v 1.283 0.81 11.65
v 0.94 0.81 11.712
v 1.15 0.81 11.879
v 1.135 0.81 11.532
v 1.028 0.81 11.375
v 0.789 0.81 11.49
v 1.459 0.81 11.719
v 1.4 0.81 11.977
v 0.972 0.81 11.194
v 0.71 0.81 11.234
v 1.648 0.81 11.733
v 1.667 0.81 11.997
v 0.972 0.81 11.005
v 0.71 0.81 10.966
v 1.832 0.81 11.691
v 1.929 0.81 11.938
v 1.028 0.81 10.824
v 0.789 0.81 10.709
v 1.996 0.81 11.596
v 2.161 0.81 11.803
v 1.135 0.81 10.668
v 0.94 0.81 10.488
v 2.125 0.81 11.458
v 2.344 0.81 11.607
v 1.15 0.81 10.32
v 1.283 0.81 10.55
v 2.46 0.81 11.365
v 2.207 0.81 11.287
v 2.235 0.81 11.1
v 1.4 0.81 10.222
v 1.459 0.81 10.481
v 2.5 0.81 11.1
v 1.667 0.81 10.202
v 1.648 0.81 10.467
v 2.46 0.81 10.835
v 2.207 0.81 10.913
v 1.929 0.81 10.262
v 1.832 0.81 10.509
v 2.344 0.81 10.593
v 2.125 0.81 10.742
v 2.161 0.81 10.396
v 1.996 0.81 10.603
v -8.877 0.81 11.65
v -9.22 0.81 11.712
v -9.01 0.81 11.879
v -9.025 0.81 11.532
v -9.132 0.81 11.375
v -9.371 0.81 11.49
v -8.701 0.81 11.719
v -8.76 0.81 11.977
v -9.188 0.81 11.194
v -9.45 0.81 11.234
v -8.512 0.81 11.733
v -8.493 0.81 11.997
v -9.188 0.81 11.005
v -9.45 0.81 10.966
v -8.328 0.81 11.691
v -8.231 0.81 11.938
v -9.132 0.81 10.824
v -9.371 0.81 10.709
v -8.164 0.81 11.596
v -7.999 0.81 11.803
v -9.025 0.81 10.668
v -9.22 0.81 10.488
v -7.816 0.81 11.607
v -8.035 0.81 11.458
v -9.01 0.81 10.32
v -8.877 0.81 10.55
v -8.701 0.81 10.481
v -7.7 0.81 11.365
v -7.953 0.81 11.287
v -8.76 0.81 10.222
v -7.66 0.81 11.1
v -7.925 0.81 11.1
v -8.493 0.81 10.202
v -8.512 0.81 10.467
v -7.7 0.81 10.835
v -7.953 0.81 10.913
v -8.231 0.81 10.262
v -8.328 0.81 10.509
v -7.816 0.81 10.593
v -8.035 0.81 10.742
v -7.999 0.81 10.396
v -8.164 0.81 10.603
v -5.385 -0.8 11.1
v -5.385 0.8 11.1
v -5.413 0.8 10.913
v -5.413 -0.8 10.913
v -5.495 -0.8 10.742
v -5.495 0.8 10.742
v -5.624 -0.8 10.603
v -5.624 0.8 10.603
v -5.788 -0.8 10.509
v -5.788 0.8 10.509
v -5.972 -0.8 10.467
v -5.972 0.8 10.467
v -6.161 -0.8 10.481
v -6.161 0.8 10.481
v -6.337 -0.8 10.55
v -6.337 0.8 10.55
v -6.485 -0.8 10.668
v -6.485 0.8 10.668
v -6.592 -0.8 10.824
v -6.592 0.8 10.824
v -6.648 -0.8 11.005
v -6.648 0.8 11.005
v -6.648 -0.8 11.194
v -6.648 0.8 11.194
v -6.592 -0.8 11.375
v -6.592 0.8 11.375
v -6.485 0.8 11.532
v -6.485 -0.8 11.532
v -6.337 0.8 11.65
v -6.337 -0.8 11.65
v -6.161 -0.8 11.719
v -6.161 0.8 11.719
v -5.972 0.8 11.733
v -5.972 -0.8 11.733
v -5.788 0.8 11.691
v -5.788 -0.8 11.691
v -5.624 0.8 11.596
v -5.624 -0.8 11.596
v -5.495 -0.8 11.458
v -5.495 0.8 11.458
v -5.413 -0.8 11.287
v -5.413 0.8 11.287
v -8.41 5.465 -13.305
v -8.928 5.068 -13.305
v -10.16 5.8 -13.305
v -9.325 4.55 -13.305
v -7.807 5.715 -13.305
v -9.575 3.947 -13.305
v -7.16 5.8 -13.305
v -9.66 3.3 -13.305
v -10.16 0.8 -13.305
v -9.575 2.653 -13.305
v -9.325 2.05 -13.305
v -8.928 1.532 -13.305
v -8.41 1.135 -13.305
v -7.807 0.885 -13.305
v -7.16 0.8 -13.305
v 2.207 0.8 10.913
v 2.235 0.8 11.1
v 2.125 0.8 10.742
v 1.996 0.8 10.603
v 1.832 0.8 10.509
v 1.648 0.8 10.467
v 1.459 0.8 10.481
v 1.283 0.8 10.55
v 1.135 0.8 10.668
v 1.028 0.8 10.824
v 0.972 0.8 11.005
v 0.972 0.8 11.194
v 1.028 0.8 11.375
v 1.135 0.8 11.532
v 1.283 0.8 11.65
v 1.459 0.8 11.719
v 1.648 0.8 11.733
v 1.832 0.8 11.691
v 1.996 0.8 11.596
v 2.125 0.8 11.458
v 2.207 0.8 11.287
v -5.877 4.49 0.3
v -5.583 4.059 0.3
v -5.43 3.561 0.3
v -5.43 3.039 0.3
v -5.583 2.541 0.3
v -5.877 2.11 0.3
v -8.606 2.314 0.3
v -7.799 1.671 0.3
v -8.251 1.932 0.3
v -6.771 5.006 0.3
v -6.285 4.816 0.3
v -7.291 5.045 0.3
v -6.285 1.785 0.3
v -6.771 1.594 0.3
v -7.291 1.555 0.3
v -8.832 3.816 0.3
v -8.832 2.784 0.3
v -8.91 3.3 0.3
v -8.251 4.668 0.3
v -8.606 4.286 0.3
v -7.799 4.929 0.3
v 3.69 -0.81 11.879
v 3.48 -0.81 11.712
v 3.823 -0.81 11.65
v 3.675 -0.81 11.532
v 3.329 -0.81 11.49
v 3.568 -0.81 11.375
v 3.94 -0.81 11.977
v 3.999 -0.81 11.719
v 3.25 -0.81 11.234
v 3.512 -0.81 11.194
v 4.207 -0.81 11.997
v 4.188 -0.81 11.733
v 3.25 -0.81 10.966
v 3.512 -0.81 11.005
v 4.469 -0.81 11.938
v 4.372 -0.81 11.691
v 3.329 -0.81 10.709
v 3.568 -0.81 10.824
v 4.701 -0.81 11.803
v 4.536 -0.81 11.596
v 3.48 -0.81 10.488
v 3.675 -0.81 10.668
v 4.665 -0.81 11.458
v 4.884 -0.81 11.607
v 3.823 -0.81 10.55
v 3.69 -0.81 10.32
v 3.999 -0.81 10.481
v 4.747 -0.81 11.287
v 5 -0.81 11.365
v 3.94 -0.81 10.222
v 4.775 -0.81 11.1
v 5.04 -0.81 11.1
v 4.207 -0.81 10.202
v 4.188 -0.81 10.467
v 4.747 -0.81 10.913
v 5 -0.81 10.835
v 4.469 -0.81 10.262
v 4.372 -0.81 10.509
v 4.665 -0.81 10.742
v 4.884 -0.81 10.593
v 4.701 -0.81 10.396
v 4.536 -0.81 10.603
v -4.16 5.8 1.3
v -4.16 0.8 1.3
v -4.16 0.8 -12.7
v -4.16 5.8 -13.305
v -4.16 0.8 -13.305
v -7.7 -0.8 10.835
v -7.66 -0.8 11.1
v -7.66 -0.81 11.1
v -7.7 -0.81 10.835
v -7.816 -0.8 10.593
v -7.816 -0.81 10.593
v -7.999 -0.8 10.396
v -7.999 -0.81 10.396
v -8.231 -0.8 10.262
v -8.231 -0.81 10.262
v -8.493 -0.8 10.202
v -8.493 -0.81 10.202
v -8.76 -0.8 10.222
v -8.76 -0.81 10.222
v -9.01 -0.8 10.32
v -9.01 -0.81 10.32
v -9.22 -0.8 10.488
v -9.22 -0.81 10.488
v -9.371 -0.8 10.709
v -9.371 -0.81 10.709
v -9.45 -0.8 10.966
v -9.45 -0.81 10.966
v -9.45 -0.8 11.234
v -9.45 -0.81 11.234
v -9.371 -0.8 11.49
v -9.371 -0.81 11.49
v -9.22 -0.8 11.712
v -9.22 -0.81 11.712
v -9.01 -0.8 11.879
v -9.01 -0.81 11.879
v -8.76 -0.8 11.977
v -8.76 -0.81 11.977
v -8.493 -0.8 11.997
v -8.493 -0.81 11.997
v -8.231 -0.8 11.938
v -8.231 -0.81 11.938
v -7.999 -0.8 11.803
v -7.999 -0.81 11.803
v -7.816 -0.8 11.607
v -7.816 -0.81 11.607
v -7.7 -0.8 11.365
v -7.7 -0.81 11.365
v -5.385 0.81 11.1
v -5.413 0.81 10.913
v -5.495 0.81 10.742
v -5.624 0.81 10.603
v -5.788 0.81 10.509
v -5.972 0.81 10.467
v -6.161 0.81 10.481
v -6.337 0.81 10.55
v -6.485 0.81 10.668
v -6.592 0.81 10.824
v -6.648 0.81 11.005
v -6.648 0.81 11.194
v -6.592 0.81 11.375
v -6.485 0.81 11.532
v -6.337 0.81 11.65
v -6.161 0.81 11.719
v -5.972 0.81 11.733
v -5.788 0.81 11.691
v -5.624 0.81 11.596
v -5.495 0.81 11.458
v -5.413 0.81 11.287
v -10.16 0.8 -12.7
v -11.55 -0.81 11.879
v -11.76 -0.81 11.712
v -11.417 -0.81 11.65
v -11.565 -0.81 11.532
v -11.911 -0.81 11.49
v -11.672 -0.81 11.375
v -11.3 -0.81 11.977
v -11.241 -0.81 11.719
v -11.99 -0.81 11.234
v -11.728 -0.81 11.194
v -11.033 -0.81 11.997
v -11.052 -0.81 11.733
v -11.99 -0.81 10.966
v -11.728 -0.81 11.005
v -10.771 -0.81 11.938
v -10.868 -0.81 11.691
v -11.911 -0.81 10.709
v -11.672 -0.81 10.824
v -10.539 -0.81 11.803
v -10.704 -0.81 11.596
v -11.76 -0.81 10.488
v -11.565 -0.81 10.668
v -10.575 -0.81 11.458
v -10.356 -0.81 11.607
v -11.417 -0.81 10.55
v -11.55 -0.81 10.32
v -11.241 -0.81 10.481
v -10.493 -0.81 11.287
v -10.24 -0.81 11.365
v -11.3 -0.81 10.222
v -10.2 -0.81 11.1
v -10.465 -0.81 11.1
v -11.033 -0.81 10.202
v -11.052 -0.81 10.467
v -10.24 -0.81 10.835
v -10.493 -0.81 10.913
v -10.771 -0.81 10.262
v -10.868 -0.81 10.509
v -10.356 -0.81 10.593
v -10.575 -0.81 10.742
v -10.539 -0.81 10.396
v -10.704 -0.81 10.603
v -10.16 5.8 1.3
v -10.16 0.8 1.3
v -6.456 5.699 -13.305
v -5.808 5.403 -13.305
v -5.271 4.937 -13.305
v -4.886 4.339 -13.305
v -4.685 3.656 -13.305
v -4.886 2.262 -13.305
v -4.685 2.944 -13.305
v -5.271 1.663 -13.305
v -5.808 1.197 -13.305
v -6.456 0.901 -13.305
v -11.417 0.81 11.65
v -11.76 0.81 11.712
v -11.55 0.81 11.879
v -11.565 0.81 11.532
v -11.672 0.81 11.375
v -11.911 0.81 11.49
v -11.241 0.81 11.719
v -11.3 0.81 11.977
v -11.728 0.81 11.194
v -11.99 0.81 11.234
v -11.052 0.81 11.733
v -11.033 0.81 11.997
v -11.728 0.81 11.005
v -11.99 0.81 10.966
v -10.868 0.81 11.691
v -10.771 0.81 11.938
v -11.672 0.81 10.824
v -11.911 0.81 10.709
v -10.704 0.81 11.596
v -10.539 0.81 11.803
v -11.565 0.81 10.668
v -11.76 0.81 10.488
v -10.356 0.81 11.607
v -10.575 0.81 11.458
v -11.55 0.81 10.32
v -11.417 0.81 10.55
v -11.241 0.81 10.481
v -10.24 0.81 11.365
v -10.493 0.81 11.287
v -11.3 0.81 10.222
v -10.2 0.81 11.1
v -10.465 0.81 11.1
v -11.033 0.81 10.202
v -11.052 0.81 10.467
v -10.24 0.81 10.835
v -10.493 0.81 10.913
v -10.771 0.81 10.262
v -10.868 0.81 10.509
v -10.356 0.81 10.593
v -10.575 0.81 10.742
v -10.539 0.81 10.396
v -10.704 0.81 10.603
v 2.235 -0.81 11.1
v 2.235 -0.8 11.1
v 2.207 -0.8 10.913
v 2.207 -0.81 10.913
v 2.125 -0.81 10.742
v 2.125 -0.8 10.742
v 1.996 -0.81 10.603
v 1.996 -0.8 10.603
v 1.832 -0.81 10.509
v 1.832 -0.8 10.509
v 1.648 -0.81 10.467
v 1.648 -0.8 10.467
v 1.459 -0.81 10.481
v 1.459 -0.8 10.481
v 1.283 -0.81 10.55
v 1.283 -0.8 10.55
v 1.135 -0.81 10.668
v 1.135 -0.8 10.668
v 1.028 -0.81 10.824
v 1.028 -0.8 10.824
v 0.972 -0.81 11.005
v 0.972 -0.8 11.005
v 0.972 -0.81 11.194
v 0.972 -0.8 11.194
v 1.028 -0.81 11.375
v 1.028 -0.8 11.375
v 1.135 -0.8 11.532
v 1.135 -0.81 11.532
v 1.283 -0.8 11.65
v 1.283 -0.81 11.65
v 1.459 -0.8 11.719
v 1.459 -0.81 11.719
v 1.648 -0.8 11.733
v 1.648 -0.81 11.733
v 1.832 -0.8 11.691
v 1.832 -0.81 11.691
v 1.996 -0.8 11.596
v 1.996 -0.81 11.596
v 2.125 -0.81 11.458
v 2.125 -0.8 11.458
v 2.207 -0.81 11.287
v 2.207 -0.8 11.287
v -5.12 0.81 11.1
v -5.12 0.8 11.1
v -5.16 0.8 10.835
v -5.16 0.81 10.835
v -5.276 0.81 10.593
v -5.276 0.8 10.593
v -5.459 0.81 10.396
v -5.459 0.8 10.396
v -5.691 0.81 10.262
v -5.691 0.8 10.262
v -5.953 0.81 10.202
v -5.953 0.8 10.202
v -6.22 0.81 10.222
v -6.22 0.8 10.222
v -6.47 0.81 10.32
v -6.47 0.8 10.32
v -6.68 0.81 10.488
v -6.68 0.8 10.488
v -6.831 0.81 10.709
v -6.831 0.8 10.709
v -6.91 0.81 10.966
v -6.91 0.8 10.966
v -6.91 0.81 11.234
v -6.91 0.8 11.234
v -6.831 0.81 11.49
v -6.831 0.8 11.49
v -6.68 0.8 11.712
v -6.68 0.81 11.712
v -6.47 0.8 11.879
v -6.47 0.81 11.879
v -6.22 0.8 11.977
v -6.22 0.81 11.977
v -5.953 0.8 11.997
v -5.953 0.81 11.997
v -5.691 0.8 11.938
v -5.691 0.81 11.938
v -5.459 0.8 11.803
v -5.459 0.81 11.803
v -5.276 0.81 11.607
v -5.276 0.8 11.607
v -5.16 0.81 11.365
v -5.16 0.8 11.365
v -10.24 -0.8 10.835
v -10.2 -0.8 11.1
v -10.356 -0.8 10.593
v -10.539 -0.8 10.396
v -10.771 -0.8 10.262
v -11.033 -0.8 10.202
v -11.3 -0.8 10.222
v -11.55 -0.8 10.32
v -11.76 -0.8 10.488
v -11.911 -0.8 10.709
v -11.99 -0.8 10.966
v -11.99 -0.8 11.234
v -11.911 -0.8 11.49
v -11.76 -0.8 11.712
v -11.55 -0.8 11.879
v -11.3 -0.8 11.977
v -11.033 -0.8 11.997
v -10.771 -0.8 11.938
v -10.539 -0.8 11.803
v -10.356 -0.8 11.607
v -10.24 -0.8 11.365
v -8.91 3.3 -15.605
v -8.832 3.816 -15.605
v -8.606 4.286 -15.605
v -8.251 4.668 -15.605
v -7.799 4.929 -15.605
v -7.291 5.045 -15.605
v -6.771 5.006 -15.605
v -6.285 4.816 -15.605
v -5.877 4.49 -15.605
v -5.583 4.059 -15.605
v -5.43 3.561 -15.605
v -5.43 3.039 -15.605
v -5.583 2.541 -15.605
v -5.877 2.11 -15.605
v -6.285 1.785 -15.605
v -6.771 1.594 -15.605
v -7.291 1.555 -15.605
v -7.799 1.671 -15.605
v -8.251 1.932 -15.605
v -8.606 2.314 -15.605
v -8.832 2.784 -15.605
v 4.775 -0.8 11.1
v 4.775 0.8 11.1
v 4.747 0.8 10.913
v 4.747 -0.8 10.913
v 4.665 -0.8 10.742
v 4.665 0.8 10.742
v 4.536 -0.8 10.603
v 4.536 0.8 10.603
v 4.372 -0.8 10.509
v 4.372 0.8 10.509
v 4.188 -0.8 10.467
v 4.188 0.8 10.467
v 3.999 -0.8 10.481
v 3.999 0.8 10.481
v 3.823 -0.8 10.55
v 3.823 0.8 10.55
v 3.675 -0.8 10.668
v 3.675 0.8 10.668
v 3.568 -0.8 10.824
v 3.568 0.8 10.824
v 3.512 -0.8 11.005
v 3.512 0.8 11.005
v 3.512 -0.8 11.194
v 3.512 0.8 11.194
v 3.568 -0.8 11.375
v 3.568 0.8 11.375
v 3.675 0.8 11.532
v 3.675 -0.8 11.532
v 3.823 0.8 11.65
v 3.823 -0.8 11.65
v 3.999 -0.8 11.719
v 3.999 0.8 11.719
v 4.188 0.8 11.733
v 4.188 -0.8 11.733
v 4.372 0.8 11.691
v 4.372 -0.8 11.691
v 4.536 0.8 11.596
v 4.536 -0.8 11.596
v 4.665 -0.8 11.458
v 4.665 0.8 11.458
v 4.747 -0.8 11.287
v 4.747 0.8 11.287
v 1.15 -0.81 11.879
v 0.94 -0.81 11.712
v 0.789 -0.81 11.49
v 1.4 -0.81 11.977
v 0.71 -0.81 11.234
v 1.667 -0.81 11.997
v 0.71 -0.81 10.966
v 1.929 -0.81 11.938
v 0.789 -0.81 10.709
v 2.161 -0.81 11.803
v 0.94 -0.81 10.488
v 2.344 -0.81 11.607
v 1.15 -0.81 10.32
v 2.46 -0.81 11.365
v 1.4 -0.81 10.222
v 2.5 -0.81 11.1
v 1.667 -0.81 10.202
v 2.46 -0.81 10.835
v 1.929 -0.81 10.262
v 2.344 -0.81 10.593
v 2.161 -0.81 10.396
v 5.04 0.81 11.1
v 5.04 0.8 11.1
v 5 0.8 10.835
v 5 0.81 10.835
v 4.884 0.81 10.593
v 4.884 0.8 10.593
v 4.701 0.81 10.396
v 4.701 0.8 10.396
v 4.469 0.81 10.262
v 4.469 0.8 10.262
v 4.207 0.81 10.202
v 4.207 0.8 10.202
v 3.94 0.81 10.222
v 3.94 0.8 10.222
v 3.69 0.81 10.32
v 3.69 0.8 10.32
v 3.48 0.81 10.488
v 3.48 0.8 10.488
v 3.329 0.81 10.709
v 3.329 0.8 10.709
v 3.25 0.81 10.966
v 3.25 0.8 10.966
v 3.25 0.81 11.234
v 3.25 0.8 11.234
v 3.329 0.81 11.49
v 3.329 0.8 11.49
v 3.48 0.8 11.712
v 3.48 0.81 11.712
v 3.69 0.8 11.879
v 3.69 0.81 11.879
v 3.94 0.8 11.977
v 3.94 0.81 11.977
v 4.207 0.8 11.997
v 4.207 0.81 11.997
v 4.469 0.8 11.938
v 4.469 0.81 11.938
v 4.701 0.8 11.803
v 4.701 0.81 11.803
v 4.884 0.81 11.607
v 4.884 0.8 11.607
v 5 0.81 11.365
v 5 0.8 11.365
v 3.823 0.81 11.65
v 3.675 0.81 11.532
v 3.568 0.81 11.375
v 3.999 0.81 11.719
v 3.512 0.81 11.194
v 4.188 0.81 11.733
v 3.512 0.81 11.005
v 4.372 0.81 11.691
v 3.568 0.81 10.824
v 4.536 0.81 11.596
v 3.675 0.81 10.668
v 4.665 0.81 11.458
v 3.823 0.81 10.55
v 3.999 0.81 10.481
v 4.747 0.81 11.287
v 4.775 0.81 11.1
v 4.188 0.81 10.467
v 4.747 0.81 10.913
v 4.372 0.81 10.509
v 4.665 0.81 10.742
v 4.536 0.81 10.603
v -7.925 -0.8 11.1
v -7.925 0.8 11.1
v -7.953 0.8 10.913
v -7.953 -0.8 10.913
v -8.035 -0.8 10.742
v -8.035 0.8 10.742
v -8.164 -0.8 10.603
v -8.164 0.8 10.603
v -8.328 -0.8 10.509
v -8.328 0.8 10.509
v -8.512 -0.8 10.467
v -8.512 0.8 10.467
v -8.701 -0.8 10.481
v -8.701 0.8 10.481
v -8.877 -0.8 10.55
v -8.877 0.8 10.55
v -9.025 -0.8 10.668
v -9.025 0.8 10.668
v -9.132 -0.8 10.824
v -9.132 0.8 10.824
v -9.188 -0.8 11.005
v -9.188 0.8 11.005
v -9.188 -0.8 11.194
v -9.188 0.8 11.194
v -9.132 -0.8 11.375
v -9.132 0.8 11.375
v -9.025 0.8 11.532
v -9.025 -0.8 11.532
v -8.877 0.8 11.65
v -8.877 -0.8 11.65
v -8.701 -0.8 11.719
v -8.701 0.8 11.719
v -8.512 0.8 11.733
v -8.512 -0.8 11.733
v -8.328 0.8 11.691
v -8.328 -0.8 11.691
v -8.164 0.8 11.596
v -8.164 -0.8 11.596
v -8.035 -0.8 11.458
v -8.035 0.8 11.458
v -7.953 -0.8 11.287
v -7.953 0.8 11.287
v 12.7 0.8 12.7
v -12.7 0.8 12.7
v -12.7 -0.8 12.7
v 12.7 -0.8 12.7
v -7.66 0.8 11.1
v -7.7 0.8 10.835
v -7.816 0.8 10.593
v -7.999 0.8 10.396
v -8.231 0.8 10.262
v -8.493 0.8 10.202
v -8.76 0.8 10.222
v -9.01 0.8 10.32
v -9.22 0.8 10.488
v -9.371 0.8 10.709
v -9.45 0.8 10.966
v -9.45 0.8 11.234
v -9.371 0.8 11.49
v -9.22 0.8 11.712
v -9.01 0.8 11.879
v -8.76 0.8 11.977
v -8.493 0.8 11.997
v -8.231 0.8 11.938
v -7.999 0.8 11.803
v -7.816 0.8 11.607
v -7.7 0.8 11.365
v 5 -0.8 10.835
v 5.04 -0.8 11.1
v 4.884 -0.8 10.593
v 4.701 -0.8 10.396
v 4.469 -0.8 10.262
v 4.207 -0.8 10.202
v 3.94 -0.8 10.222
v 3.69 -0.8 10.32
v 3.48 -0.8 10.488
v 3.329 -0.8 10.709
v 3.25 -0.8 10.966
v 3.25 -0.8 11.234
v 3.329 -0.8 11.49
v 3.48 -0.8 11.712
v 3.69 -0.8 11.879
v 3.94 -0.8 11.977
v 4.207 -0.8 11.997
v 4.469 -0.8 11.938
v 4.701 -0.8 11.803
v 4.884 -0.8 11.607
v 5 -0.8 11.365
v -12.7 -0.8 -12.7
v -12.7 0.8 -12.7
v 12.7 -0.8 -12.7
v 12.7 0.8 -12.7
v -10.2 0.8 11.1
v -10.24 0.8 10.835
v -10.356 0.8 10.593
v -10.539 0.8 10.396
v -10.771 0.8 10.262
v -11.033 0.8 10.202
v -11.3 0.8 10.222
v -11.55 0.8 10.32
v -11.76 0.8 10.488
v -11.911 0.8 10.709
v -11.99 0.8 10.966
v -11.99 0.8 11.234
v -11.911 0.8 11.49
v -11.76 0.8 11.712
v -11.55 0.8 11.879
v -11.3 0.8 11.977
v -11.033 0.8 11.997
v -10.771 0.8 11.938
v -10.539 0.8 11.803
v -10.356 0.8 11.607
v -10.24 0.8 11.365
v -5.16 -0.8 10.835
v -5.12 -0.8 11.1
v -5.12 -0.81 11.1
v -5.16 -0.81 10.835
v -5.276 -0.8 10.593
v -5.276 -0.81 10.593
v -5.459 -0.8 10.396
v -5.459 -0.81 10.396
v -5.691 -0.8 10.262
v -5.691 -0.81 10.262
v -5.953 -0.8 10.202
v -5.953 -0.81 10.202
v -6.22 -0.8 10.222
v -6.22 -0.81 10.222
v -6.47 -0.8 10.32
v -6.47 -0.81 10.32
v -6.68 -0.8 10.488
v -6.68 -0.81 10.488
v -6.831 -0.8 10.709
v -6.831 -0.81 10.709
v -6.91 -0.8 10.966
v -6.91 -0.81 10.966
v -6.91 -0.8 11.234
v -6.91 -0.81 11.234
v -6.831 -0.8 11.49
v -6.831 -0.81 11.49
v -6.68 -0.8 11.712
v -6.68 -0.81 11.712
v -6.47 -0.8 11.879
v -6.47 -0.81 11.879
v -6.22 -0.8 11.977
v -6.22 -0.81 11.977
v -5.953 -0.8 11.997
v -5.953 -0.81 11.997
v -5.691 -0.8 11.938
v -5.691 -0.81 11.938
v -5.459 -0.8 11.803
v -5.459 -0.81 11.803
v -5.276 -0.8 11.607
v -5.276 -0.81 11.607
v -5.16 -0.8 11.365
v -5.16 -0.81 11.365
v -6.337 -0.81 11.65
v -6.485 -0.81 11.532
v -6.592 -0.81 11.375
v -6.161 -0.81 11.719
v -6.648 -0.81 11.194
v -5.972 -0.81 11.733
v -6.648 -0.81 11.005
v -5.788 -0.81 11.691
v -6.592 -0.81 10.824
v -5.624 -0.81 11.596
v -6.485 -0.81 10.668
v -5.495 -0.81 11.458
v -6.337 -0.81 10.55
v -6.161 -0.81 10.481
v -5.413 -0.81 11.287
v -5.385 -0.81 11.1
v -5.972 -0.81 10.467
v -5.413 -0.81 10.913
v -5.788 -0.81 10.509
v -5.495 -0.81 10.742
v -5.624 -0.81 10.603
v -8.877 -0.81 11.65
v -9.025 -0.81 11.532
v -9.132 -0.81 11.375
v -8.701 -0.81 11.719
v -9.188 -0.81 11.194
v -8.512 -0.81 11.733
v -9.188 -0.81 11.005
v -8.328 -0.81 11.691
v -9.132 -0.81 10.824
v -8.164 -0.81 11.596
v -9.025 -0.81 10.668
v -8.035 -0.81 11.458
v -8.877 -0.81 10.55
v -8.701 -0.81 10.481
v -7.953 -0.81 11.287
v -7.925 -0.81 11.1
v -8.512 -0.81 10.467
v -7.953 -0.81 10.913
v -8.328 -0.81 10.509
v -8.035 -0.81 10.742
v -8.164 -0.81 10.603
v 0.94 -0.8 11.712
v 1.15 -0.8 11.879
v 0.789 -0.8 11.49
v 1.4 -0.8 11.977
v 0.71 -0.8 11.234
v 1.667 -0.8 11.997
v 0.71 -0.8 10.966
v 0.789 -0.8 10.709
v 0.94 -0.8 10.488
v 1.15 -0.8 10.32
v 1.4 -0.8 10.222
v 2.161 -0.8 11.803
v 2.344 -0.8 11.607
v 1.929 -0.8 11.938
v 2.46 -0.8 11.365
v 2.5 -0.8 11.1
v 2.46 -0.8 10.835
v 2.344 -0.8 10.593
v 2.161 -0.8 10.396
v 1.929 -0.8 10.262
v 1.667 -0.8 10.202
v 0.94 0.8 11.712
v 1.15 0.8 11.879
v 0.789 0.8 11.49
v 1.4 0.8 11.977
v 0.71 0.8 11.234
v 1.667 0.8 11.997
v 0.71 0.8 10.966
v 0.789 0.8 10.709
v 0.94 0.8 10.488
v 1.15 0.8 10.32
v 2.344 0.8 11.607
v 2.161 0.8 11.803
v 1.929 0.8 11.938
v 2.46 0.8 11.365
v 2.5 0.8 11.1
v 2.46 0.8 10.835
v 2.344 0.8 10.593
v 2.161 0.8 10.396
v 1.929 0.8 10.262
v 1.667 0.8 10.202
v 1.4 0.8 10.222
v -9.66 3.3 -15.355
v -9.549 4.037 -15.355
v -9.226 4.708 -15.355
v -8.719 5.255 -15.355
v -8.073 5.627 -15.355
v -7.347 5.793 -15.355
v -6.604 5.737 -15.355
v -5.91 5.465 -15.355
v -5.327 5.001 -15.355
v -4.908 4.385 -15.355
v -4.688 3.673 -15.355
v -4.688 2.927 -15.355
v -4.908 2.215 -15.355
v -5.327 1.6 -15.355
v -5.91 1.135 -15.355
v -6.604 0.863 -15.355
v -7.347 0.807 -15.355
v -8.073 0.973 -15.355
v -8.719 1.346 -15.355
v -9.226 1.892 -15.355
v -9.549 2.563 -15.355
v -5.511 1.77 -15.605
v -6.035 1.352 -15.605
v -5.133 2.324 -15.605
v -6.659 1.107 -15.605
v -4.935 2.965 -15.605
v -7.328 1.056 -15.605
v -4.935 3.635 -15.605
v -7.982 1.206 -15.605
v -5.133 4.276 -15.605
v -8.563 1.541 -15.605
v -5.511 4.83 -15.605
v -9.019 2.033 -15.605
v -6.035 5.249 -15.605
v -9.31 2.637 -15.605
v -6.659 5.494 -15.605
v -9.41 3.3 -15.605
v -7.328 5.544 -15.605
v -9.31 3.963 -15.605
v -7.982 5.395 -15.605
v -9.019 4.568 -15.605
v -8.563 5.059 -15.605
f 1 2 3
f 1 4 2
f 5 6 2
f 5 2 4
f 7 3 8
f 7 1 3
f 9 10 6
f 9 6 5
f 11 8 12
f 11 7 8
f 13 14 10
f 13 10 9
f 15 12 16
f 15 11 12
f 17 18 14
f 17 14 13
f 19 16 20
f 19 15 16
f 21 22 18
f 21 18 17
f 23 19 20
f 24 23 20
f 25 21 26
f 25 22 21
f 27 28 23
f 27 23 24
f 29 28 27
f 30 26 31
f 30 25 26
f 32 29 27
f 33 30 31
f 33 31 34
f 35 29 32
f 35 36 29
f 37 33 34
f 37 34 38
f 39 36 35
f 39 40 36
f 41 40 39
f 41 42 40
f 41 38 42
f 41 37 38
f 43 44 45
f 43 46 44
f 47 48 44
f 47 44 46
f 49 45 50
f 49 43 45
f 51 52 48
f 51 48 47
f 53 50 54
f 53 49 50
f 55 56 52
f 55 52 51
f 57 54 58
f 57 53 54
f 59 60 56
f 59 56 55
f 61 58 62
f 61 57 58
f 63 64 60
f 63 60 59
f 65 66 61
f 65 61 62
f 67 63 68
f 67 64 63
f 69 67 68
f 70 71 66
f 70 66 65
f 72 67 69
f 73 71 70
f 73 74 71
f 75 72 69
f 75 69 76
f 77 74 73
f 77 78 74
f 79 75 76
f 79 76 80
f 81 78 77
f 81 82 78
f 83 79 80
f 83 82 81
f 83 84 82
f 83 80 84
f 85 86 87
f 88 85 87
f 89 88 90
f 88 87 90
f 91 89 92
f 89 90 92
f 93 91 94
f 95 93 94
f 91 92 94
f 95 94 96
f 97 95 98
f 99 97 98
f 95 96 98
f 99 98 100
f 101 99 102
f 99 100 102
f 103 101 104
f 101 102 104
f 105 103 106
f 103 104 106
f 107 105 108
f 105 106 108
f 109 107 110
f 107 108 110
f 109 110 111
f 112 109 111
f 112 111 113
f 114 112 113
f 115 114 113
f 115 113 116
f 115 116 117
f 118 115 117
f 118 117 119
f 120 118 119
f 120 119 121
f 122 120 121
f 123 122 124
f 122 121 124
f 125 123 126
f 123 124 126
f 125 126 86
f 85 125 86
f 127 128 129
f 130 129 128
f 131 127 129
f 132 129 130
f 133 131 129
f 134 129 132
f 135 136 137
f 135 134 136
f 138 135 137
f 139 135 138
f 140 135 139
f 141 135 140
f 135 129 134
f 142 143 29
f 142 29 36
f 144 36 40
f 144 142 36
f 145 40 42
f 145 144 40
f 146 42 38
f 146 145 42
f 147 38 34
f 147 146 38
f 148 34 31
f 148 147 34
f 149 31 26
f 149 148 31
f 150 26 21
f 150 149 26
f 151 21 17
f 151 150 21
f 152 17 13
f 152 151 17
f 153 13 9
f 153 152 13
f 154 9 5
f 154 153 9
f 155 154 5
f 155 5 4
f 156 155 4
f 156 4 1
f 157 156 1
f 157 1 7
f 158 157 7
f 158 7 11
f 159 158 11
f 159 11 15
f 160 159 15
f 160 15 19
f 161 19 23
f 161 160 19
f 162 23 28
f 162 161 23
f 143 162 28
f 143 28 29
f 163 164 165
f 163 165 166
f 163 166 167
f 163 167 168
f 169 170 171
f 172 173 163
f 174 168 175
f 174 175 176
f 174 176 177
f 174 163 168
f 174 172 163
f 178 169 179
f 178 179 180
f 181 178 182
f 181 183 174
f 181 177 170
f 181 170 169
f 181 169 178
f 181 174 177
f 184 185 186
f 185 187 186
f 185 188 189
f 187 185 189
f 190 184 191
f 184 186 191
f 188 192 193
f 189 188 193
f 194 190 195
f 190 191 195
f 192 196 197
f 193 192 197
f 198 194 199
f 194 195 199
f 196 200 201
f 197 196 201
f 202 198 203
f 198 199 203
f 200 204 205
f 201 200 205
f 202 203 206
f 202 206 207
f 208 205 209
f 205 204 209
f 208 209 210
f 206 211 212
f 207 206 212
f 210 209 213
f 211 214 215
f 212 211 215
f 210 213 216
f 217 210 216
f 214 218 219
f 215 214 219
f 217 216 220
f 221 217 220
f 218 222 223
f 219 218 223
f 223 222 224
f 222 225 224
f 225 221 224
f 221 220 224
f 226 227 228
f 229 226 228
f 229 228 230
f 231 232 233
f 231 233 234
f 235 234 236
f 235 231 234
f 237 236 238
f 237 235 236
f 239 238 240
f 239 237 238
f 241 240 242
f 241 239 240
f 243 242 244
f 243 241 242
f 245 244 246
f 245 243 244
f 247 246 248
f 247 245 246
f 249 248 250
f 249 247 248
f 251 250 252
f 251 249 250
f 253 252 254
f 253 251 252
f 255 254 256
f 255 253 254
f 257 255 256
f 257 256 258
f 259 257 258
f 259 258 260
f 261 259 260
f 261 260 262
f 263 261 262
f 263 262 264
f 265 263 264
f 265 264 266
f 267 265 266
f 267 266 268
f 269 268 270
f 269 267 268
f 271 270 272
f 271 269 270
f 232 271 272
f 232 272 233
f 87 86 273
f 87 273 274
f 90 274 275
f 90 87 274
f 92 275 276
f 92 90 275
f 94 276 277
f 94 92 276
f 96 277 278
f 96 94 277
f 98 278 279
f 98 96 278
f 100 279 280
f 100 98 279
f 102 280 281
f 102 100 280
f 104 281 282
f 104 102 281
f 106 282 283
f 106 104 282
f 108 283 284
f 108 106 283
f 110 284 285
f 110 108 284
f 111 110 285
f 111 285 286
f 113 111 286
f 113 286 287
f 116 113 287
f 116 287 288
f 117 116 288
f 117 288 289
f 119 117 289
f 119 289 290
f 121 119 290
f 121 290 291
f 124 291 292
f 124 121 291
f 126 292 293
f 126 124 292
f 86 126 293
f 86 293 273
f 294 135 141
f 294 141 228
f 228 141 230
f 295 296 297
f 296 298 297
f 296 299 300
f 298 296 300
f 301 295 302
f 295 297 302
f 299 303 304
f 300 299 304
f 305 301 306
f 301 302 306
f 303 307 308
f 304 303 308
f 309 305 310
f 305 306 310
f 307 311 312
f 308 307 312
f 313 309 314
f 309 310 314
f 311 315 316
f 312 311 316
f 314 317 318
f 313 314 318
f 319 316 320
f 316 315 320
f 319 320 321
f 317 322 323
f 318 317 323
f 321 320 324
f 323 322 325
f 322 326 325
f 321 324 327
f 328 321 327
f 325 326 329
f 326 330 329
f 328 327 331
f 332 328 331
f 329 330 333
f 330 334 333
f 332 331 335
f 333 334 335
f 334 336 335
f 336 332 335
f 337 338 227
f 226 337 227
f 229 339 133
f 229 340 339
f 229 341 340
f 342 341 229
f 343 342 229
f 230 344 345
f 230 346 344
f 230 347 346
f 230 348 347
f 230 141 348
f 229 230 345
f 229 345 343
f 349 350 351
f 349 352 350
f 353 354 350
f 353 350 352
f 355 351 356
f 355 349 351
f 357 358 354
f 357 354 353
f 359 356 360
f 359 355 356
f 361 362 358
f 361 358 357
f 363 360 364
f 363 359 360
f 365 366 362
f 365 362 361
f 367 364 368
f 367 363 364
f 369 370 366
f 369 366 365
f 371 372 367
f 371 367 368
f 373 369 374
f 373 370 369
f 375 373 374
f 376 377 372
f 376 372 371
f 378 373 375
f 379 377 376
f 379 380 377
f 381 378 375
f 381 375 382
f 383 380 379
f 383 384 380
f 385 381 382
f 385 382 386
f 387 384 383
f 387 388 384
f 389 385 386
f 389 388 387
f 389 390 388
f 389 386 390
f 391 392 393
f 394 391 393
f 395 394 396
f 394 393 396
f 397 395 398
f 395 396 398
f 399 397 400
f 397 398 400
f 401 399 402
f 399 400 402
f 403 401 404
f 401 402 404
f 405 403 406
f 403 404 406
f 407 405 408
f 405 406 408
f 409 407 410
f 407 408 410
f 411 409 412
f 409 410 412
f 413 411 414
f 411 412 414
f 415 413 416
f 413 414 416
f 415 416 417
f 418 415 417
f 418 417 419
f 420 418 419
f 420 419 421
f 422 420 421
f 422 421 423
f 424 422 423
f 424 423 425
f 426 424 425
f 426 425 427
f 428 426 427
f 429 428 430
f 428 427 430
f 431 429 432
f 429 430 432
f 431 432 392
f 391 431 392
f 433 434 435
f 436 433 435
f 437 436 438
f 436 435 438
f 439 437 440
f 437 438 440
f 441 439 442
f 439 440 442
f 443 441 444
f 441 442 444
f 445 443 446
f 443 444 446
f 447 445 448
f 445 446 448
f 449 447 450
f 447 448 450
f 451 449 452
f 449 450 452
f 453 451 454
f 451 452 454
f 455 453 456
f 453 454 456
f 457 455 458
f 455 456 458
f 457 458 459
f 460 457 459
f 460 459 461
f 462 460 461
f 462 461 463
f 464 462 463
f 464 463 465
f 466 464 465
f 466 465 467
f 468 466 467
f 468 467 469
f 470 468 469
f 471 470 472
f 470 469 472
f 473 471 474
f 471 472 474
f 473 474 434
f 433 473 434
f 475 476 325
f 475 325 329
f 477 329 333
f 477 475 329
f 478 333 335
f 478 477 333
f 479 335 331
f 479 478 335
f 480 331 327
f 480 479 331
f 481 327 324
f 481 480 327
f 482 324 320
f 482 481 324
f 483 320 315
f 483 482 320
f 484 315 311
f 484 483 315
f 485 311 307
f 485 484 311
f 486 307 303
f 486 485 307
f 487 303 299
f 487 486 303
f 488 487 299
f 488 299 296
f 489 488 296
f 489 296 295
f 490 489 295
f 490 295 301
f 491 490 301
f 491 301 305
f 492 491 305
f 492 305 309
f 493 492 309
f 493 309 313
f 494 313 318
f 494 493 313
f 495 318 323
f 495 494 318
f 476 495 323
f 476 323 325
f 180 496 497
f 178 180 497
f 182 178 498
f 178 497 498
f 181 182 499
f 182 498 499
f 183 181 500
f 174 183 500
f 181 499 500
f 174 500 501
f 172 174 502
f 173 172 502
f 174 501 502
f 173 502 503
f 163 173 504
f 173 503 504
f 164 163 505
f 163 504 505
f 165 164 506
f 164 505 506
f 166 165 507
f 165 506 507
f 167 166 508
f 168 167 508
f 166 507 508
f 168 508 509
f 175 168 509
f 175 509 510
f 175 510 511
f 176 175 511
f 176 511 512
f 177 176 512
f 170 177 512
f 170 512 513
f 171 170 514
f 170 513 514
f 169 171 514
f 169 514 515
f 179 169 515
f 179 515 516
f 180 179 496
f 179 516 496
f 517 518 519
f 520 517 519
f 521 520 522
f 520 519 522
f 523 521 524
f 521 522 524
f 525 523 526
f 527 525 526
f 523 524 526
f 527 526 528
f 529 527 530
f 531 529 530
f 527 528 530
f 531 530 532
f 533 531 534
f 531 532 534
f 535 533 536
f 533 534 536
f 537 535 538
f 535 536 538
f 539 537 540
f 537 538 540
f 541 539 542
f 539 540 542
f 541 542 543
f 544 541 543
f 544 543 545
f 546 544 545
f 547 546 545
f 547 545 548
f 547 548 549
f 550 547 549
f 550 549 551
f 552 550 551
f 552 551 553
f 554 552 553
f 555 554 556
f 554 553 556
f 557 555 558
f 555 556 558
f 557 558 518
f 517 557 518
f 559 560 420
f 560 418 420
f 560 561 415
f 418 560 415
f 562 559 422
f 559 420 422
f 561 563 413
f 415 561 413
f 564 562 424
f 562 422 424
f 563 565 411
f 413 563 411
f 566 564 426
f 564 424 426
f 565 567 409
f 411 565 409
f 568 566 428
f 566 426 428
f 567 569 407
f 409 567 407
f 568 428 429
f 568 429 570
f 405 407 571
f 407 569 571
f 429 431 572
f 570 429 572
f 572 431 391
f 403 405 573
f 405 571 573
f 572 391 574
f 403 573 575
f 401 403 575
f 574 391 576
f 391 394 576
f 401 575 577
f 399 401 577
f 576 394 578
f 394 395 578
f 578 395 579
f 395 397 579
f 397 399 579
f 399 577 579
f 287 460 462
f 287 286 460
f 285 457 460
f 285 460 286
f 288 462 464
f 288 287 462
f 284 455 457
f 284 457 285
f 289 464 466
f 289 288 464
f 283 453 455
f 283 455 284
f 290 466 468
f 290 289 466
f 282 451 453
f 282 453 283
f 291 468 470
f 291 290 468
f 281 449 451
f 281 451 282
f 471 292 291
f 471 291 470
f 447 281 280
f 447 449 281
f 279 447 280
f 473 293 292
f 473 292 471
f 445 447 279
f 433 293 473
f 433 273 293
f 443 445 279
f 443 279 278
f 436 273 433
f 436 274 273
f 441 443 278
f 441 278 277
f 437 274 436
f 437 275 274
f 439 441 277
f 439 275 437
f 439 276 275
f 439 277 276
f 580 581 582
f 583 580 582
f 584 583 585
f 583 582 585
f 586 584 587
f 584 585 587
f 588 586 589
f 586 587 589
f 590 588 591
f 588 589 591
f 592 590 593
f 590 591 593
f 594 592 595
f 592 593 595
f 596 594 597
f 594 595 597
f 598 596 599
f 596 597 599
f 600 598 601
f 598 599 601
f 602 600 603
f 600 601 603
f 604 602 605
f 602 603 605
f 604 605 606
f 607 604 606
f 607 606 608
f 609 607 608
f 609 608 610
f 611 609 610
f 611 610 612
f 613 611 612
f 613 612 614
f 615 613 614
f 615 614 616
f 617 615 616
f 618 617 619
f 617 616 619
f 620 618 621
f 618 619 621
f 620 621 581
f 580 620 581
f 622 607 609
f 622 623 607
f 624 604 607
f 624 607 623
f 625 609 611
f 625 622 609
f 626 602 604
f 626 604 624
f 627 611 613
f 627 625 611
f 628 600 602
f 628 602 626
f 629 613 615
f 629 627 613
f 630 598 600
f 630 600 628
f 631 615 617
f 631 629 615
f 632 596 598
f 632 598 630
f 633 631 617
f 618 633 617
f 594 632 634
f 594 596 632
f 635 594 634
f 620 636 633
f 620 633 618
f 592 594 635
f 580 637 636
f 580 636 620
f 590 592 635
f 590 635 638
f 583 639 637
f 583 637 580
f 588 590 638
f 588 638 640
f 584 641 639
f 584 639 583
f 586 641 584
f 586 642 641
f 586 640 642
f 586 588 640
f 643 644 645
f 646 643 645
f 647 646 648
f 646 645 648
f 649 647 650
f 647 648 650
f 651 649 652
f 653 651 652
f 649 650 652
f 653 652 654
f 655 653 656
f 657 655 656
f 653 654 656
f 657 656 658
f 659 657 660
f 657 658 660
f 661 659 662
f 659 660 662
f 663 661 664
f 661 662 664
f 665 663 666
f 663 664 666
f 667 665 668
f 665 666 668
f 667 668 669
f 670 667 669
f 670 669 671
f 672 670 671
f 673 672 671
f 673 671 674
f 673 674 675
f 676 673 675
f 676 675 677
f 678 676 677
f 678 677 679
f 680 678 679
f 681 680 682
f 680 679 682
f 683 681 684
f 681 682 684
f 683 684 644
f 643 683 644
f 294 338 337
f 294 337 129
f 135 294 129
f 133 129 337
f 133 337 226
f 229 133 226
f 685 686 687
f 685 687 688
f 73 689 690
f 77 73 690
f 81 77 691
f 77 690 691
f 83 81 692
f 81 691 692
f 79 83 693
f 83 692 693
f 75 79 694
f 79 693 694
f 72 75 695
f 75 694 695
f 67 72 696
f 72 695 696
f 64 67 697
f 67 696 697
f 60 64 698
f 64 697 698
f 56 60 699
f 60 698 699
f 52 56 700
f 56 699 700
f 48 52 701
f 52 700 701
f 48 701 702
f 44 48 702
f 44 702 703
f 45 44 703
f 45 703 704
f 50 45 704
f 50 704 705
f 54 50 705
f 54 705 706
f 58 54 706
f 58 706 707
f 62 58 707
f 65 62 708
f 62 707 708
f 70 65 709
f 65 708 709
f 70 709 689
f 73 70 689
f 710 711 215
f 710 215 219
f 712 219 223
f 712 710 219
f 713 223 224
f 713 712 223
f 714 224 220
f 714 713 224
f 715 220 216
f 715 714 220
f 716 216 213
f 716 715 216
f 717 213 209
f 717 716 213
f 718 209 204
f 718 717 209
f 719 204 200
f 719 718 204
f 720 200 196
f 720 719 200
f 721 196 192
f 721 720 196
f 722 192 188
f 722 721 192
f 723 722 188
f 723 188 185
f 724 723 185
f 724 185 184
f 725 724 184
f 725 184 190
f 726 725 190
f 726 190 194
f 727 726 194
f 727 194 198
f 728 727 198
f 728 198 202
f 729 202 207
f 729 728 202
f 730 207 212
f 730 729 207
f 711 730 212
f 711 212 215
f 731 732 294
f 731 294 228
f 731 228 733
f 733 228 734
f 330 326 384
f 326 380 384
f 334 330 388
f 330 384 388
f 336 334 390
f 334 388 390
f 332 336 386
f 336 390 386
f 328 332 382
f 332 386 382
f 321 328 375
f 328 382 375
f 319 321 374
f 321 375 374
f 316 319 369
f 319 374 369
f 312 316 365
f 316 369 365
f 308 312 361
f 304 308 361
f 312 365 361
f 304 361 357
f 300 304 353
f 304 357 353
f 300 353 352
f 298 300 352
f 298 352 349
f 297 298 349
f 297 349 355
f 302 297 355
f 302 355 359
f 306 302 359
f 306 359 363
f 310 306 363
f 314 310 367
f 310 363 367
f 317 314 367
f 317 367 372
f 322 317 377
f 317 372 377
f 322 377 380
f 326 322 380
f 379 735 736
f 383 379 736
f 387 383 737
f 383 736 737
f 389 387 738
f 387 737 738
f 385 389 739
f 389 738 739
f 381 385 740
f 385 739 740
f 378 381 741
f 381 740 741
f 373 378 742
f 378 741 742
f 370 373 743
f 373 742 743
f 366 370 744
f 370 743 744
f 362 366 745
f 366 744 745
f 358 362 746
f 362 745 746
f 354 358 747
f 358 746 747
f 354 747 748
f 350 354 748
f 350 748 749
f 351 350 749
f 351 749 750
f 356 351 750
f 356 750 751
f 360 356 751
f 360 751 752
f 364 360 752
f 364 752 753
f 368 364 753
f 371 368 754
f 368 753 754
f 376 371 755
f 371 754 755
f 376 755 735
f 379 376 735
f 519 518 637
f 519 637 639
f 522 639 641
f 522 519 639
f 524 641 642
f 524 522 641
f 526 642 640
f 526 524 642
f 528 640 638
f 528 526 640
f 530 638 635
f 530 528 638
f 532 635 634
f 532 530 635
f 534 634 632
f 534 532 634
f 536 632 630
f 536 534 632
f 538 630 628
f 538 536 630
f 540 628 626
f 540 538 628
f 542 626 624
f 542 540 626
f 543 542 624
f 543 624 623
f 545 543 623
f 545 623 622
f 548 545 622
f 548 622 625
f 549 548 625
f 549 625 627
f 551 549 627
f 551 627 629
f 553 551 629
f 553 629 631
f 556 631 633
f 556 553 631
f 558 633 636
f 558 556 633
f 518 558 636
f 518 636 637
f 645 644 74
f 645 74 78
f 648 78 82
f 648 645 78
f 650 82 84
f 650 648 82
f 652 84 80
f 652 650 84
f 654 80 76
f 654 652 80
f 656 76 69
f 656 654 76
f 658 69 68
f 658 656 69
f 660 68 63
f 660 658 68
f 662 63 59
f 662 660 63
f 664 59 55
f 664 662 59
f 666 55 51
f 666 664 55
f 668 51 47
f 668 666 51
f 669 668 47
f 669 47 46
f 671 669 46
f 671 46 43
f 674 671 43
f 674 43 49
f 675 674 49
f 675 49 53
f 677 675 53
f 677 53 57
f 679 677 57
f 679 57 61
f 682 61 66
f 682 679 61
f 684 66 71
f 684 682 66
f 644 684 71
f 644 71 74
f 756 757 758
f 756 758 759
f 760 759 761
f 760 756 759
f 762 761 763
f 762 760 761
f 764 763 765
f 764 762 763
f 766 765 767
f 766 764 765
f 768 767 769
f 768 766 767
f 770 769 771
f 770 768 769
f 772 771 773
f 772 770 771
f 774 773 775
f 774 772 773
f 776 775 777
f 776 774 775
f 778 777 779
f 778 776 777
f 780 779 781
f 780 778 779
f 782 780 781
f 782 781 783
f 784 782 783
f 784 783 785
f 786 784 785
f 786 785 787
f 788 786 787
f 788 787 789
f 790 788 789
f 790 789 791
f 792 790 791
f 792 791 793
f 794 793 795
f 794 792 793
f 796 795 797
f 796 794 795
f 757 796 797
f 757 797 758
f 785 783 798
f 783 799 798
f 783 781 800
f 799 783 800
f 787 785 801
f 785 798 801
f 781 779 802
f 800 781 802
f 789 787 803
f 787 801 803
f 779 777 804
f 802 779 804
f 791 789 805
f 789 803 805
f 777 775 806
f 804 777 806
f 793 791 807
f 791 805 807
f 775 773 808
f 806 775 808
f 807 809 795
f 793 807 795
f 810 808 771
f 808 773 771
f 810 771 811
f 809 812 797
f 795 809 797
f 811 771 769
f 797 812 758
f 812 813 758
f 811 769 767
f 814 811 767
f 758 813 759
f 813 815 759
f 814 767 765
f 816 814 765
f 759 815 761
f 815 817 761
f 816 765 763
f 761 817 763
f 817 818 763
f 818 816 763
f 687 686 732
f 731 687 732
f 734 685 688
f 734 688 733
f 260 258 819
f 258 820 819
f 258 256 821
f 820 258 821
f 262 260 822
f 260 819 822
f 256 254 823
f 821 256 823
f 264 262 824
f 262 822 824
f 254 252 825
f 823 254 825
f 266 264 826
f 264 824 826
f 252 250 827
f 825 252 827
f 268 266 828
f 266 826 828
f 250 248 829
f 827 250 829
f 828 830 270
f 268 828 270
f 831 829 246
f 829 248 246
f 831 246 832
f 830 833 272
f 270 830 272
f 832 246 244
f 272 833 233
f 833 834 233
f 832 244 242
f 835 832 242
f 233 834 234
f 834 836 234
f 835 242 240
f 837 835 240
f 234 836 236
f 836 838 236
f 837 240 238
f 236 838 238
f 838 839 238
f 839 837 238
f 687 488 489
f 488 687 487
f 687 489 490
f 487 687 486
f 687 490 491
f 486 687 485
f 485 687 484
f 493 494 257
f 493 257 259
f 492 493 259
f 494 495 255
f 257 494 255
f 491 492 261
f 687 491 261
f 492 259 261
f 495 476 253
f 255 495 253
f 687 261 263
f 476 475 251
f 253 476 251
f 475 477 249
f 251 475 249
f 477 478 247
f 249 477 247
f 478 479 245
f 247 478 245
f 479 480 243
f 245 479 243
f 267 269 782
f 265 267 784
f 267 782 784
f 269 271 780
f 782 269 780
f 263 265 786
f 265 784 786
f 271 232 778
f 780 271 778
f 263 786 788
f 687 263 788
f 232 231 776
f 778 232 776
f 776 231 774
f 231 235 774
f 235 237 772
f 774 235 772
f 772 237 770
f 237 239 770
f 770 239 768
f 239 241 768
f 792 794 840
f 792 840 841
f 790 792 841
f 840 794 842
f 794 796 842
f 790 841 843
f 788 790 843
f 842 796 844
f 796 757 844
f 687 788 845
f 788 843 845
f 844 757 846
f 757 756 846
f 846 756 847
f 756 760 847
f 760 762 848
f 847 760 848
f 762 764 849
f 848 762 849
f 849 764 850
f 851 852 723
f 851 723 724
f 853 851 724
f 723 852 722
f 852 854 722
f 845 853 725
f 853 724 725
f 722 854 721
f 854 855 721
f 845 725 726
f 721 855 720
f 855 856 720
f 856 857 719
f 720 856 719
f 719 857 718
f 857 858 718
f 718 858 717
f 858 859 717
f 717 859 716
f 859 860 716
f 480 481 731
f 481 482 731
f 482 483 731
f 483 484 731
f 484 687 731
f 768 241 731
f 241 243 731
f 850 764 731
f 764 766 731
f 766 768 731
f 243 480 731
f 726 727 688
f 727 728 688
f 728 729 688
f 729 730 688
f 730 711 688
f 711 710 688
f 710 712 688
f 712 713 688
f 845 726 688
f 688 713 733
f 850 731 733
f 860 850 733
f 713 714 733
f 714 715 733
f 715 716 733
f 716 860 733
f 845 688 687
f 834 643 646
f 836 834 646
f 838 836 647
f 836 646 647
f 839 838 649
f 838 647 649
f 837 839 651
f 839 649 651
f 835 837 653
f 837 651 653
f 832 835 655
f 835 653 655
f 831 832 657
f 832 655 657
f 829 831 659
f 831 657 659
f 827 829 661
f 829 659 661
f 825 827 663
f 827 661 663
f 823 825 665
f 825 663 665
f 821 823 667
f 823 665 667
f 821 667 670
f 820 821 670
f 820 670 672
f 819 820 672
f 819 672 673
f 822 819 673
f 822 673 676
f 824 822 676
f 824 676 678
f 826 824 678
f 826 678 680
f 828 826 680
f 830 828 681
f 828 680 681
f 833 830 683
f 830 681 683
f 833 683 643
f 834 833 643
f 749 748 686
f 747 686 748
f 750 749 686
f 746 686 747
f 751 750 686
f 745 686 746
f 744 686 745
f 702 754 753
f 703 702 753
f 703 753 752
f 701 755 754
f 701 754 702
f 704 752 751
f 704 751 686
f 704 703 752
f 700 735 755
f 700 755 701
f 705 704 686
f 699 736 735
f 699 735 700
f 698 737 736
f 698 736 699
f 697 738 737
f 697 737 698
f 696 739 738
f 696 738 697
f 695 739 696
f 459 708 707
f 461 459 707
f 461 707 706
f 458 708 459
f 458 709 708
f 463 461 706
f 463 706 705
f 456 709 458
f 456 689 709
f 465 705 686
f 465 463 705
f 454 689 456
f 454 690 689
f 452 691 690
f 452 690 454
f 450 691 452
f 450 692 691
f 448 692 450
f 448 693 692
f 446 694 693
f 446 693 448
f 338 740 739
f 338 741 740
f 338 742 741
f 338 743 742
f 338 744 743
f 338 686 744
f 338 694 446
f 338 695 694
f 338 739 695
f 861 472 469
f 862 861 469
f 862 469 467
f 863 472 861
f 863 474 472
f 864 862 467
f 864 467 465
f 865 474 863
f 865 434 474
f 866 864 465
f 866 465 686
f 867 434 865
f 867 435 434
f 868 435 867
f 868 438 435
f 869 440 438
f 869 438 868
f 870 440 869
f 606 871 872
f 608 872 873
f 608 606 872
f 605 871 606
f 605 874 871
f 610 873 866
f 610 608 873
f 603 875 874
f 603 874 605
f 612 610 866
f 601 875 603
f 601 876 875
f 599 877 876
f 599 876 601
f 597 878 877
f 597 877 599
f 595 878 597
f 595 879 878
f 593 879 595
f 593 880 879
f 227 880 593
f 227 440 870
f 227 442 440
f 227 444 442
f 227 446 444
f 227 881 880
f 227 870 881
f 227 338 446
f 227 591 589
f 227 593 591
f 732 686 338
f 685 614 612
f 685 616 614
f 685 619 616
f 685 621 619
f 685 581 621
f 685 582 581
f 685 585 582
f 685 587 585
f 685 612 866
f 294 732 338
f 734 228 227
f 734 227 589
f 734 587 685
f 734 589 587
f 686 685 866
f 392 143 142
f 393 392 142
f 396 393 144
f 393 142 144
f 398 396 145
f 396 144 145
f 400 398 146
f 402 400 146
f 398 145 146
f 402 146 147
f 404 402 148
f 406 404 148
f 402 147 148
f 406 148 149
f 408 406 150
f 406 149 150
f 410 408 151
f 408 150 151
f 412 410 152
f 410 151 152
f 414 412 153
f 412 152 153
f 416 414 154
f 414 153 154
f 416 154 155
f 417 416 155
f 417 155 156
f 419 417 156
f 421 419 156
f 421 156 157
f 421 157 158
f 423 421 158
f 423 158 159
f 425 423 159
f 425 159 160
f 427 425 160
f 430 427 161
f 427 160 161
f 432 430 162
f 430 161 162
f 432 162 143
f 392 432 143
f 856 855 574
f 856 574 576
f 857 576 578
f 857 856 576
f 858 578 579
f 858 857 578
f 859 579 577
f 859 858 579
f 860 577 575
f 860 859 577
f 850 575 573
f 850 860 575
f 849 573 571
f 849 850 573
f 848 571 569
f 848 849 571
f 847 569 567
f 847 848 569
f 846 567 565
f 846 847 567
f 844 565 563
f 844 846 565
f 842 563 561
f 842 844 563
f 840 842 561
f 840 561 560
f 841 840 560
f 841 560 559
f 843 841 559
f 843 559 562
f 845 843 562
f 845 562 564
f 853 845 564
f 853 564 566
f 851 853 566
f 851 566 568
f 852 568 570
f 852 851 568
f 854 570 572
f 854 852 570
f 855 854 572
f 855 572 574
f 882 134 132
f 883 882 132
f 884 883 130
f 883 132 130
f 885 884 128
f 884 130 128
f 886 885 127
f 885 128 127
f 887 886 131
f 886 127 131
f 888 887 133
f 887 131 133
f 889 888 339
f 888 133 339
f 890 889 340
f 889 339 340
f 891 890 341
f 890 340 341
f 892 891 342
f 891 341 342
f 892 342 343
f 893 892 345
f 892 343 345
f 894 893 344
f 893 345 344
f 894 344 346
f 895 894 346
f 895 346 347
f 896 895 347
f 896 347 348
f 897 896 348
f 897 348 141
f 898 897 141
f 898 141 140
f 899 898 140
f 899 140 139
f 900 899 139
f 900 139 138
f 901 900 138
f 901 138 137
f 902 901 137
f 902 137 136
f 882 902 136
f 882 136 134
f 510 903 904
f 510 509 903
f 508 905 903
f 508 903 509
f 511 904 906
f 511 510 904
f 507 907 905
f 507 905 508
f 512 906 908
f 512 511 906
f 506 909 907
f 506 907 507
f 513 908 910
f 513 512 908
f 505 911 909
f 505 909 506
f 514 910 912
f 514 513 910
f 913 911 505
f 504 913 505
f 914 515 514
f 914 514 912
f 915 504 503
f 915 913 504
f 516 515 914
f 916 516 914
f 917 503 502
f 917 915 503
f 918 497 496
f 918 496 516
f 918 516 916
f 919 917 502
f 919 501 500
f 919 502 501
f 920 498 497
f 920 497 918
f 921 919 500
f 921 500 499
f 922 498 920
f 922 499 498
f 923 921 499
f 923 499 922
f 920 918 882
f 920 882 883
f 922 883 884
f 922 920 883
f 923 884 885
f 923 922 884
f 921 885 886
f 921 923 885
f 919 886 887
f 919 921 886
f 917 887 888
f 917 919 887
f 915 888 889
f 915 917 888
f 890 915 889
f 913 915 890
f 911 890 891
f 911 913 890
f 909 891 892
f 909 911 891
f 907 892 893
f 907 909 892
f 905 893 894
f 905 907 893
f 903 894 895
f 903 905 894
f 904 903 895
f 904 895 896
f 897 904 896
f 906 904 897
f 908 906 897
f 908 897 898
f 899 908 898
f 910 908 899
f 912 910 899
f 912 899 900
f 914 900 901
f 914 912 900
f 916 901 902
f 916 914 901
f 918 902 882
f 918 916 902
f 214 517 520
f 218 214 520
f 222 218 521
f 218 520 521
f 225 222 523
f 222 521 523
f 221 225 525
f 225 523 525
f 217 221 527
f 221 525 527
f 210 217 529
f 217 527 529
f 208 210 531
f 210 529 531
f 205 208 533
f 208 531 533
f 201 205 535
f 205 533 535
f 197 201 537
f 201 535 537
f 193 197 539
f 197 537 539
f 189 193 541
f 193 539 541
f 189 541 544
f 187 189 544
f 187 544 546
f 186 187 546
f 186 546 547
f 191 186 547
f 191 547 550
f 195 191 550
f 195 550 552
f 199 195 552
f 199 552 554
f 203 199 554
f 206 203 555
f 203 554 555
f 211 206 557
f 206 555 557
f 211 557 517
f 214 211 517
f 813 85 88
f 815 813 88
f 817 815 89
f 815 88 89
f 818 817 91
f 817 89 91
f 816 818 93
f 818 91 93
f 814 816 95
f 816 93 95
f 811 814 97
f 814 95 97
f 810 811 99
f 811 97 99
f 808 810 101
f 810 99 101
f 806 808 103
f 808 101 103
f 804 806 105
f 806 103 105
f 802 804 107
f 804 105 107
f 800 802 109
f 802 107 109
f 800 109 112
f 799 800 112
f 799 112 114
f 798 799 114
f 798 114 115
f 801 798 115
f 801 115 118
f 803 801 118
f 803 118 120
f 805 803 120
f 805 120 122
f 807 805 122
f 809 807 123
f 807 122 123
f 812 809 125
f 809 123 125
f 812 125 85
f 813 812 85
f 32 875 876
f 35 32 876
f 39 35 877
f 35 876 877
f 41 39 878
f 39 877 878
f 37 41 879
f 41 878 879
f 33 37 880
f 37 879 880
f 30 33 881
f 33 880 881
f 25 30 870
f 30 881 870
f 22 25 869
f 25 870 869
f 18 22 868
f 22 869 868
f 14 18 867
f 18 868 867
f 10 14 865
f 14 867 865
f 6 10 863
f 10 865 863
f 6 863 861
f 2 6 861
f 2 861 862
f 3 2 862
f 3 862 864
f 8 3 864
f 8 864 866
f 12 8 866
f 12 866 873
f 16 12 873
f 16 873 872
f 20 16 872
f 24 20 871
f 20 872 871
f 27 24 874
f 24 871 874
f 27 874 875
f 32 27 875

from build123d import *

# Parameters (mm, degrees)
SKETCH1_W           = 25.4
SKETCH1_H           = 25.4
BOSS_EXTRUDE1_DEPTH = 0.8001
SKETCH2_R           = 0.635
CUT_EXTRUDE1_DEPTH  = 1.6002
SKETCH3_W           = 6
SKETCH3_H           = 14.605
BOSS_EXTRUDE2_DEPTH = 5
SKETCH4_R           = 2.5
BOSS_EXTRUDE3_DEPTH = 2.3
SKETCH5_R           = 1.75
CUT_EXTRUDE4_DEPTH  = 15.905
CHAMFER1_SIZE       = 0.25
SKETCH6_R           = 0.9
SKETCH6_R_2         = 0.635
BOSS_EXTRUDE4_DEPTH = 0.01


with BuildPart() as part:
    # Sketch1 → Boss-Extrude1 (new body, symmetric)
    with BuildSketch(Plane(origin=(0, 0, 0), x_dir=(1, 0, 0), z_dir=(0, 1, 0))):
        Rectangle(SKETCH1_W, SKETCH1_H)
    extrude(amount=BOSS_EXTRUDE1_DEPTH, both=True)

    # Sketch2 → Cut-Extrude1 (cut)
    with BuildSketch(Plane(origin=(0, 0.8001, 0), x_dir=(1, 0, 0), z_dir=(0, 1, 0))):
        with Locations((-11.0998, -11.0998)):
            Circle(SKETCH2_R)
        with Locations((-8.5598, -11.0998)):
            Circle(SKETCH2_R)
        with Locations((-6.0198, -11.0998)):
            Circle(SKETCH2_R)
        with Locations((1.6002, -11.0998)):
            Circle(SKETCH2_R)
        with Locations((4.1402, -11.0998)):
            Circle(SKETCH2_R)
    extrude(amount=-CUT_EXTRUDE1_DEPTH, mode=Mode.SUBTRACT)

    # Sketch3 → Boss-Extrude2 (add)
    with BuildSketch(Plane(origin=(0, 0.8001, 0), x_dir=(1, 0, 0), z_dir=(0, 1, 0))):
        with Locations((-7.16, 6.0025)):
            Rectangle(SKETCH3_W, SKETCH3_H)
    extrude(amount=BOSS_EXTRUDE2_DEPTH)

    # Sketch4 → Boss-Extrude3 (add)
    with BuildSketch(Plane(origin=(0, 0, -13.305), x_dir=(-1, 0, 0), z_dir=(0, 0, -1))):
        with Locations((7.16, 3.3001)):
            Circle(SKETCH4_R)
    extrude(amount=BOSS_EXTRUDE3_DEPTH)

    # Sketch5 → Cut-Extrude4 (cut)
    with BuildSketch(Plane(origin=(0, 0, -15.605), x_dir=(-1, 0, 0), z_dir=(0, 0, -1))):
        with Locations((7.16, 3.3001)):
            Circle(SKETCH5_R)
    extrude(amount=-CUT_EXTRUDE4_DEPTH, mode=Mode.SUBTRACT)

    # Chamfer1
    chamfer1_edges = [part.edges().sort_by_distance(p)[0] for p in [
        (-4.66, 3.3001, -15.605),
    ]]
    chamfer(chamfer1_edges, length=CHAMFER1_SIZE)

    # Sketch6 → Boss-Extrude4 (add)
    with BuildSketch(Plane(origin=(0, 0.8001, 0), x_dir=(1, 0, 0), z_dir=(0, 1, 0))):
        with Locations((-11.0998, -11.0998)):
            Circle(SKETCH6_R)
        with Locations((-11.0998, -11.0998)):
            Circle(SKETCH6_R_2, mode=Mode.SUBTRACT)
        with Locations((-8.5598, -11.0998)):
            Circle(SKETCH6_R)
        with Locations((-8.5598, -11.0998)):
            Circle(SKETCH6_R_2, mode=Mode.SUBTRACT)
        with Locations((-6.0198, -11.0998)):
            Circle(SKETCH6_R)
        with Locations((-6.0198, -11.0998)):
            Circle(SKETCH6_R_2, mode=Mode.SUBTRACT)
        with Locations((1.6002, -11.0998)):
            Circle(SKETCH6_R)
        with Locations((1.6002, -11.0998)):
            Circle(SKETCH6_R_2, mode=Mode.SUBTRACT)
        with Locations((4.1402, -11.0998)):
            Circle(SKETCH6_R)
        with Locations((4.1402, -11.0998)):
            Circle(SKETCH6_R_2, mode=Mode.SUBTRACT)
    boss_extrude4 = extrude(amount=BOSS_EXTRUDE4_DEPTH)

    # Mirror1: Boss-Extrude4 across plane
    add(boss_extrude4.mirror(Plane.ZX))


solid = part.part
